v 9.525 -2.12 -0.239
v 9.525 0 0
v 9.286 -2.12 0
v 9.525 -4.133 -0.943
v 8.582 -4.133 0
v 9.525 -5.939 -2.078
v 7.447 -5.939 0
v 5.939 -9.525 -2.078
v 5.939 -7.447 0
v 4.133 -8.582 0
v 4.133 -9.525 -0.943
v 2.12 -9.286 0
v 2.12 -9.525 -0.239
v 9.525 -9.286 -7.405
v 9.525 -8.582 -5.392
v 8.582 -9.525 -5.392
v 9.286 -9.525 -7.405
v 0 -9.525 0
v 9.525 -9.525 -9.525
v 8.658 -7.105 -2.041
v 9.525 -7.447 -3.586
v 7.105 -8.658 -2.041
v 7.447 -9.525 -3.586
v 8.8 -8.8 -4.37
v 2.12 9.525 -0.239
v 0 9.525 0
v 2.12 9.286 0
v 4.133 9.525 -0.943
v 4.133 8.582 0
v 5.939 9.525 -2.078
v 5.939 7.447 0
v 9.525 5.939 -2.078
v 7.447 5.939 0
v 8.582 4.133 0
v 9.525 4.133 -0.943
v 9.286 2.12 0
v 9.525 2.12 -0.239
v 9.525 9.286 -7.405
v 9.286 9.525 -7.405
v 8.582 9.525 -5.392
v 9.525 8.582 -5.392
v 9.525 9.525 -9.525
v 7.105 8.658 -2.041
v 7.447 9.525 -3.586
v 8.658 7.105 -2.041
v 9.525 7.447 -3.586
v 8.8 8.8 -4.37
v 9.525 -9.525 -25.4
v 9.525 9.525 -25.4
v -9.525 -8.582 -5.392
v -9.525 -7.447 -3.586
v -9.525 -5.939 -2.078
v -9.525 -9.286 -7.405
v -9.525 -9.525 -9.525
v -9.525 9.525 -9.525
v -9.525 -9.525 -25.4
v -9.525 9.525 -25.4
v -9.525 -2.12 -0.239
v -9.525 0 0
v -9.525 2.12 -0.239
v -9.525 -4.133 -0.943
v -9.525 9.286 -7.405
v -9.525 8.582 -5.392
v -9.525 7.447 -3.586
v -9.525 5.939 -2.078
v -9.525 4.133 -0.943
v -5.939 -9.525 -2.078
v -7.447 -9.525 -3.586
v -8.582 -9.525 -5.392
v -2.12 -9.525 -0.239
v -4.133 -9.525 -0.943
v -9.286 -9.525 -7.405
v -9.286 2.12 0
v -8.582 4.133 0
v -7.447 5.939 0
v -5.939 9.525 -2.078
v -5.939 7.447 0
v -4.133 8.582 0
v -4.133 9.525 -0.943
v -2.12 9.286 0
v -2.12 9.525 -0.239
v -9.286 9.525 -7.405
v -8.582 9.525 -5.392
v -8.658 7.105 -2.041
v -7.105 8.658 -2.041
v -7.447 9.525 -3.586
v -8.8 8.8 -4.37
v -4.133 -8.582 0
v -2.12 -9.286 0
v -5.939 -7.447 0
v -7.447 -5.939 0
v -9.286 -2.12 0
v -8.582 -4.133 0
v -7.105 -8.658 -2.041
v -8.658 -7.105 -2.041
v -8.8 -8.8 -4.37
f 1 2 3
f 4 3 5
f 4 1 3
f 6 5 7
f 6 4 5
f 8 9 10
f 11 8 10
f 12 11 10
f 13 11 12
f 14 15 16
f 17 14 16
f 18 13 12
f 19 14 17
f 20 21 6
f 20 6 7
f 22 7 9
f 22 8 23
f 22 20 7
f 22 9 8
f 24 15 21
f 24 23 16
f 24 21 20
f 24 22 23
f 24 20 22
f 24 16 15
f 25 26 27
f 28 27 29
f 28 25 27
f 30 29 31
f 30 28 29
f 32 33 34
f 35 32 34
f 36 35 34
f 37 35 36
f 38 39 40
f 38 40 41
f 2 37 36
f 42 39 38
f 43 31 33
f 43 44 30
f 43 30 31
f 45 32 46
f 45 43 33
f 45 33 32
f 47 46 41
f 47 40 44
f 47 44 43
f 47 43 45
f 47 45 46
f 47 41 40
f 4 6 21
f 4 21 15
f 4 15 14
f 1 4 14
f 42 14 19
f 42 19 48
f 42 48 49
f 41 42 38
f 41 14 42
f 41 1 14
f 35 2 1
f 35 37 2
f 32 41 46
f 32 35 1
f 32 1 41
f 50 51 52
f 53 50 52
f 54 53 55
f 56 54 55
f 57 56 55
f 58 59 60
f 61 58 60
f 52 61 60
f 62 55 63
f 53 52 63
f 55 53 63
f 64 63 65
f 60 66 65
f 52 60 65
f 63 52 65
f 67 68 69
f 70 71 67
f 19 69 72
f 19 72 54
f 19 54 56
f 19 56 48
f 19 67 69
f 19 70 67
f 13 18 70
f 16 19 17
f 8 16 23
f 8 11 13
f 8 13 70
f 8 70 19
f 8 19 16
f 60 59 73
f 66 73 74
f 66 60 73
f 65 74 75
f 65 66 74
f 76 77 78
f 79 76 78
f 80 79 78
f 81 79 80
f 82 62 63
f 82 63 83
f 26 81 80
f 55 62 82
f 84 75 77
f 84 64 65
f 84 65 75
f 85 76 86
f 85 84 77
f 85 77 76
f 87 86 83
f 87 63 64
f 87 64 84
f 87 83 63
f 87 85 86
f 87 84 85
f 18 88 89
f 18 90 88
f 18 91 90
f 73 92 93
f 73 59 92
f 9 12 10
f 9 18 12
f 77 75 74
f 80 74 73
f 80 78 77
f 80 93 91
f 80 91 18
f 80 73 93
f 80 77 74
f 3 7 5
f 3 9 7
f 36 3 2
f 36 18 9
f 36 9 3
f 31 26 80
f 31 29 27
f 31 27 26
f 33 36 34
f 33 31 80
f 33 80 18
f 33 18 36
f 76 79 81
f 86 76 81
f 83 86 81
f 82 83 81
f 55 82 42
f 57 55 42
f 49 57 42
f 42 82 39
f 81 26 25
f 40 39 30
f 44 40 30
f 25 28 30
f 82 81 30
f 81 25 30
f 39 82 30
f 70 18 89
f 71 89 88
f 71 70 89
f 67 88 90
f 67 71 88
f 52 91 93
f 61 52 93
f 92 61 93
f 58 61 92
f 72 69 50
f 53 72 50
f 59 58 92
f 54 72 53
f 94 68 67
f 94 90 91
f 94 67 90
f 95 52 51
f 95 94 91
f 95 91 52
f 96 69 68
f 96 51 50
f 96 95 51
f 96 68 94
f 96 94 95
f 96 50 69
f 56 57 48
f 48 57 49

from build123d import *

# Parameters (mm, degrees)
F0_W     = 19.05
F0_H     = 19.05
F1_DEPTH = 25.4


with BuildPart() as f1:
    # F0 (on Top) → F1 (new body)
    with BuildSketch(Plane.XY):
        Rectangle(F0_W, F0_H)
    extrude(amount=-F1_DEPTH)

    # F3 (on 3pt) → F4 (revolve, cut)
    with BuildSketch(Plane(origin=(0, 0, 0), x_dir=(0.7071067812, 0.7071067812, 0), z_dir=(0.7071067812, -0.7071067812, 0))):
        with BuildLine():
            ThreePointArc((0, 3.9453841816), (9.525, 0), (13.4703841816, -9.525))
            Line((13.4703841816, -9.525), (16.0103841816, -9.525))
            Line((16.0103841816, -9.525), (16.0103841816, 6.4853841816))
            Line((16.0103841816, 6.4853841816), (0, 6.4853841816))
            Line((0, 6.4853841816), (0, 3.9453841816))
        make_face()
    revolve(axis=Axis((0, 0, -8.7556987966), (0, 0, -1)), mode=Mode.SUBTRACT)


solid = f1.part
